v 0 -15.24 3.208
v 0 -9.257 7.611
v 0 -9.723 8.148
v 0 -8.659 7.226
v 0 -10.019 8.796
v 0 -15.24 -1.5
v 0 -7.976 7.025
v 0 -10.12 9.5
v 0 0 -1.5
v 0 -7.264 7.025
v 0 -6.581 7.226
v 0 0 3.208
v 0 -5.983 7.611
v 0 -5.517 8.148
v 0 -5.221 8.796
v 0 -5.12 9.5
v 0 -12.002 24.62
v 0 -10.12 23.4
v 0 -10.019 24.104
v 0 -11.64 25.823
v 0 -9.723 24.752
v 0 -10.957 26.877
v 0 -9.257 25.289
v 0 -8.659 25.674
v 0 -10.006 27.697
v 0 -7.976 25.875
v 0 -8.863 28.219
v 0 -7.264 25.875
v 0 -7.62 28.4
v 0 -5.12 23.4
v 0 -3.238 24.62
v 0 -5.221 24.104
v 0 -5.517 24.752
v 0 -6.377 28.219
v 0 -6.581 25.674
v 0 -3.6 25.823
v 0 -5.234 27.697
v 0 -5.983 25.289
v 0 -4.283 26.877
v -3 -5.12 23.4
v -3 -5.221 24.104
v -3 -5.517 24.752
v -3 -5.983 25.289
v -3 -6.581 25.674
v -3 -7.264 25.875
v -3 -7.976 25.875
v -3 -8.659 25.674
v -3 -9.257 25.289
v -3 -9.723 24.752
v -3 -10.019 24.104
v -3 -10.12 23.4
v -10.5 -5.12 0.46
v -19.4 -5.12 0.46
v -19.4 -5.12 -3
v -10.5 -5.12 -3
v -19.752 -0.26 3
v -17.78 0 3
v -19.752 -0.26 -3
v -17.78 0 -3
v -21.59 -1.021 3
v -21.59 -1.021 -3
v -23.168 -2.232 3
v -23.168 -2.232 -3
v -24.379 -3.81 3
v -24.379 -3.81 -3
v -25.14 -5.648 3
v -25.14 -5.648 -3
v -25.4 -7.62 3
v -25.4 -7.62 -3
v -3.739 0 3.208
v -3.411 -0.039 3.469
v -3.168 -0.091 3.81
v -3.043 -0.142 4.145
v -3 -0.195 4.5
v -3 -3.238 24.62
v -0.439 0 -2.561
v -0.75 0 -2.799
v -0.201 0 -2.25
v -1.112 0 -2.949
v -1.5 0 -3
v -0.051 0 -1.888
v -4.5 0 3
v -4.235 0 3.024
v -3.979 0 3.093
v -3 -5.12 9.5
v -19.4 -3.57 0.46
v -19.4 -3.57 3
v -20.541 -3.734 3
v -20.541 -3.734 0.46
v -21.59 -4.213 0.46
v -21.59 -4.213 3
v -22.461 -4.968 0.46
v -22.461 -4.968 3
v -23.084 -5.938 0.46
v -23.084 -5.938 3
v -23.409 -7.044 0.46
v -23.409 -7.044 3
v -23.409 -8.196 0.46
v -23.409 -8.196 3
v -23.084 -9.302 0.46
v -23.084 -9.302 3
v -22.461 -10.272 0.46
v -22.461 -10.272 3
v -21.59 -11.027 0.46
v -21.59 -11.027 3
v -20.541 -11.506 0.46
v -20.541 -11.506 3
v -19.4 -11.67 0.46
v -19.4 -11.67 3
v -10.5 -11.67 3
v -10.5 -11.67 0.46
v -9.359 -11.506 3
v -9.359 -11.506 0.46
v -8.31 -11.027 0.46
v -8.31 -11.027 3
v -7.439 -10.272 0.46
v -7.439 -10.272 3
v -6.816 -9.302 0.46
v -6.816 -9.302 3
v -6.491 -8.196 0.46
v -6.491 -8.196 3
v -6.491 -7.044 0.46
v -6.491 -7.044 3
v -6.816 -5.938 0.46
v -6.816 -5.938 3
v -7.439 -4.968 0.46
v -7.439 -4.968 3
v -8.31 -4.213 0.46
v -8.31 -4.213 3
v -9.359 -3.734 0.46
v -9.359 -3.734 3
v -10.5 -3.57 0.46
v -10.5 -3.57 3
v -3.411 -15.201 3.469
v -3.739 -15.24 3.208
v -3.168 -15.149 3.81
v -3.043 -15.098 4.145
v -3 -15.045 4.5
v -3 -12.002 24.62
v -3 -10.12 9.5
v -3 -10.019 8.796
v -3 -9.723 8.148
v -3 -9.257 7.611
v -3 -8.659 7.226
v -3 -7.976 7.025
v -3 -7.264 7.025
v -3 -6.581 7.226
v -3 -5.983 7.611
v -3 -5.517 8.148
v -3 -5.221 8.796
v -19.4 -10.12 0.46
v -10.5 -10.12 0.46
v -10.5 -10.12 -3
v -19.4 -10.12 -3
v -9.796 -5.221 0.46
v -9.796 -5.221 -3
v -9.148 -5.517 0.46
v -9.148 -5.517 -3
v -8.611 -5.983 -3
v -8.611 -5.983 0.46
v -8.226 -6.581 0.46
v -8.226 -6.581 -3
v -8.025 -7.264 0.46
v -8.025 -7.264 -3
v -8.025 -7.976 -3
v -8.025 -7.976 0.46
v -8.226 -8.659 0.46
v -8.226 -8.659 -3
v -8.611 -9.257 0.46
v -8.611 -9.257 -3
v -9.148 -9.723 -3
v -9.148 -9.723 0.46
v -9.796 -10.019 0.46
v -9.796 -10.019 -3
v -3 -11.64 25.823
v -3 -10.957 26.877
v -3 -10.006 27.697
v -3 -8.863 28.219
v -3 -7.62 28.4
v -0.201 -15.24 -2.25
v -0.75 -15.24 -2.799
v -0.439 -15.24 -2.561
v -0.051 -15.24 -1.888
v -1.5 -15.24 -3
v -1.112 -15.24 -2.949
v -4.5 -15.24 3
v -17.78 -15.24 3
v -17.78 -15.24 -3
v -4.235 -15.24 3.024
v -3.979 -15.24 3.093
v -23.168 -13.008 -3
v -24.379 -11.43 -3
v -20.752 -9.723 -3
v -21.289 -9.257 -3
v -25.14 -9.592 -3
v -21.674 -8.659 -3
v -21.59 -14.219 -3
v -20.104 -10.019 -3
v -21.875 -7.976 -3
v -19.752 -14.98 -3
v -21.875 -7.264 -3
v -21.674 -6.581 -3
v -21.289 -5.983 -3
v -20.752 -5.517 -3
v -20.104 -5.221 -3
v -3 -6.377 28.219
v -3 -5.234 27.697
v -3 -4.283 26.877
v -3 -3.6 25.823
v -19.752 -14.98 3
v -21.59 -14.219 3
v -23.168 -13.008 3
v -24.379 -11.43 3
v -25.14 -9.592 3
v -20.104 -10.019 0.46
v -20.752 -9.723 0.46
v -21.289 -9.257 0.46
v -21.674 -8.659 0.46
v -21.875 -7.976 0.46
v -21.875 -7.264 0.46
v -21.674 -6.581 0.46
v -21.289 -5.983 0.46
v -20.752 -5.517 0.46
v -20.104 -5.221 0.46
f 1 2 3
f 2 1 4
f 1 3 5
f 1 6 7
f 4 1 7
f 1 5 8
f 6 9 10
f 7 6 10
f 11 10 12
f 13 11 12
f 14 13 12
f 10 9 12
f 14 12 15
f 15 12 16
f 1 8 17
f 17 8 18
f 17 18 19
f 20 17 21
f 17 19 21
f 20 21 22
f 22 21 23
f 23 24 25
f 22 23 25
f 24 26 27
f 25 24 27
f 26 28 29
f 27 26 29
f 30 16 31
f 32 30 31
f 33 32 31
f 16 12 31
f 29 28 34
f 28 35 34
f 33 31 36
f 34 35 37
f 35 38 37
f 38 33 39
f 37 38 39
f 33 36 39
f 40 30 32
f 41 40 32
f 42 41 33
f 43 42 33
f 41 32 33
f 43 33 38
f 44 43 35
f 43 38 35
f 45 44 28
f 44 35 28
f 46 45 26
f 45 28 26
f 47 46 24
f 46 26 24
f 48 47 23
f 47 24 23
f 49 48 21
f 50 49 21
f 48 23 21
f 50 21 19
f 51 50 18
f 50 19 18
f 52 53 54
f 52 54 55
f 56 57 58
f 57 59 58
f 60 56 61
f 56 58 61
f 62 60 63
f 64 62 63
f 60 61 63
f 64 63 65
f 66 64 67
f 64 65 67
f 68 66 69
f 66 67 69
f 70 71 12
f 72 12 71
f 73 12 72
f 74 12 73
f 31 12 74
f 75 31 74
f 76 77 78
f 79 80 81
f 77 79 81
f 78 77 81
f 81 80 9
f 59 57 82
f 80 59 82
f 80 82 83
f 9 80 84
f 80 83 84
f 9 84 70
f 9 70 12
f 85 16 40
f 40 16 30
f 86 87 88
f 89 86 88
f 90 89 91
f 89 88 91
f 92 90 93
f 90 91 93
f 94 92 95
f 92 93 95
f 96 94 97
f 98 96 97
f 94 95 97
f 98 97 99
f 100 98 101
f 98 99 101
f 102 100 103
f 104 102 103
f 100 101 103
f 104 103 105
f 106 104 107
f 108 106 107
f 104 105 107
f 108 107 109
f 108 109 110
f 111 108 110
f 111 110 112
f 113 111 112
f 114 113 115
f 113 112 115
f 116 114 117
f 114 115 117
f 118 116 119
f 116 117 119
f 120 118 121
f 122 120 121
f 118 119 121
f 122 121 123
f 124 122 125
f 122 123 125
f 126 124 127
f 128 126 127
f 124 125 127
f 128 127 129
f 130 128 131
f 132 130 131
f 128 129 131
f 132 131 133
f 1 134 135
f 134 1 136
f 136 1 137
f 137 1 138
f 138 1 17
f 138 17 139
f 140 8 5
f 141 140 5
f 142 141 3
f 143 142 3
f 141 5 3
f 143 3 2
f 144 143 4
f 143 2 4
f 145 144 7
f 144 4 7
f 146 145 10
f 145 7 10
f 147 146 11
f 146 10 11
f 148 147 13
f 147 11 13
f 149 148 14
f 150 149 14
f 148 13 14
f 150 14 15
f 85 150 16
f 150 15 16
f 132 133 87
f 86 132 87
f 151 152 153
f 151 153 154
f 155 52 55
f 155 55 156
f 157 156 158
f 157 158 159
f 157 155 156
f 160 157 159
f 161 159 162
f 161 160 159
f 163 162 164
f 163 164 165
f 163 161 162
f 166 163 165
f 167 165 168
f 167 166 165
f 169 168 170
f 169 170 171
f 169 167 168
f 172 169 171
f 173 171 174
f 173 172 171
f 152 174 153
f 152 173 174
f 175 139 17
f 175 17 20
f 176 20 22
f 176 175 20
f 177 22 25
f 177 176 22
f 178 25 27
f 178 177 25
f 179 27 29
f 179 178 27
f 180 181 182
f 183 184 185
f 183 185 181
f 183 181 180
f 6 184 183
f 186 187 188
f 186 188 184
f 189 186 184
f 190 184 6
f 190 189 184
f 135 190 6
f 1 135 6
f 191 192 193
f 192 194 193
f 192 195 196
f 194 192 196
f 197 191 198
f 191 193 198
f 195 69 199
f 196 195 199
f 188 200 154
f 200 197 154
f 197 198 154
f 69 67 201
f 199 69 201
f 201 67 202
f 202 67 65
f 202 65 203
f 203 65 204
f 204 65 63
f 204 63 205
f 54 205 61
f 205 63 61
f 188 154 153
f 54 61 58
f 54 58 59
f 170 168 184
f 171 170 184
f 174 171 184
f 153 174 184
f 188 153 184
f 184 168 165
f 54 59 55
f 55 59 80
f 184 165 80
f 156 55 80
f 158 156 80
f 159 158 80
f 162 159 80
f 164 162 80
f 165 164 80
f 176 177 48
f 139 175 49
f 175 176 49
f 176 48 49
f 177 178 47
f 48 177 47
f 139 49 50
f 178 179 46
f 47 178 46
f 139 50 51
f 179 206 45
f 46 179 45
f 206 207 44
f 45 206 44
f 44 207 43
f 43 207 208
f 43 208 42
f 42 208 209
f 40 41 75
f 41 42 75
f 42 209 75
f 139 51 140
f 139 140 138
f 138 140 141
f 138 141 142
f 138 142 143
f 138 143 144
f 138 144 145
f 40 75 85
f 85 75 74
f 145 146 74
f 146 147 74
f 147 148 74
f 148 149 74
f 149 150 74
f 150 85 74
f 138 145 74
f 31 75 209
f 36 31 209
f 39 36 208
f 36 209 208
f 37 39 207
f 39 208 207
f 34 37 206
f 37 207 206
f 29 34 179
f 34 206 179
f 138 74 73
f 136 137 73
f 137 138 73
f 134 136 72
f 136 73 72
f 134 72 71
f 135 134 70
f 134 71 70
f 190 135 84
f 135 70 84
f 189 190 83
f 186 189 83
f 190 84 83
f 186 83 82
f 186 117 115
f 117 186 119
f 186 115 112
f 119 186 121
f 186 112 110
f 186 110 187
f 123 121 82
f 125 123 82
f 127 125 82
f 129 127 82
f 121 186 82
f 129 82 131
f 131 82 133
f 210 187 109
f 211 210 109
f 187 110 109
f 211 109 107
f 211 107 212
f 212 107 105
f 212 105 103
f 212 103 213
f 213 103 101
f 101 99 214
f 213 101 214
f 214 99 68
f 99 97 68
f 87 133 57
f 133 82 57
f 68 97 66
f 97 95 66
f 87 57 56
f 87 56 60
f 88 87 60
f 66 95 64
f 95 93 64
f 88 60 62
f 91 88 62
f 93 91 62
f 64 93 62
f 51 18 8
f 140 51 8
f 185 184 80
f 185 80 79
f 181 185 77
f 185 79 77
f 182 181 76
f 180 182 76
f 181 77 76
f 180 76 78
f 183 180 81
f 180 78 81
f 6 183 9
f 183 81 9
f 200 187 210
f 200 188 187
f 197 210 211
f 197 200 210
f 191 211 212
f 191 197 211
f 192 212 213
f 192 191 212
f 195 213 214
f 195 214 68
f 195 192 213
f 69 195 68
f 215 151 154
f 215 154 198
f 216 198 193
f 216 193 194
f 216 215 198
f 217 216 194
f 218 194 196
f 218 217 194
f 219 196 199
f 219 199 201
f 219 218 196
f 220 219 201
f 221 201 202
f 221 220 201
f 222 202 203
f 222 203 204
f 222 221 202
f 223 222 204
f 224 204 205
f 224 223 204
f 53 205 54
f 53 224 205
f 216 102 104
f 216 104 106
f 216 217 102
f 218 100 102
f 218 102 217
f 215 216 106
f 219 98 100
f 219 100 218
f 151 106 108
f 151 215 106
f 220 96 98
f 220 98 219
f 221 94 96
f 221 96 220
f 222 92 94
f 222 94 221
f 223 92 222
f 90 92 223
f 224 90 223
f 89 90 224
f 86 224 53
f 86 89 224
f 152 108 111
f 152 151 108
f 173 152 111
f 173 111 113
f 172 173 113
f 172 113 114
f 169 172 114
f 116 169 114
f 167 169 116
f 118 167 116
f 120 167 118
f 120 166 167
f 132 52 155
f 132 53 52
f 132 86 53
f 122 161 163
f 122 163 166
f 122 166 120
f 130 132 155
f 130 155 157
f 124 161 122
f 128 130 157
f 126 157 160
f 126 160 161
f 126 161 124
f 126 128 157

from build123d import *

# Parameters (mm, degrees)
F1_DEPTH    = 15.24
F3_DEPTH    = 3
F5_DEPTH    = 2.54
F6_DEPTH    = 6
F7_C1_SIZE2 = 3.81
F7_C1_SIZE  = 25.1924509954
F7_C2_SIZE2 = 3.81
F7_C2_SIZE  = 25.1924509954
F8_T1_DEPTH = 22.1165158115
F9_R        = 7.61999


# Not quite as in the source:
# - a fillet or chamfer that OpenCascade refuses, or shapes differently, is made with other operations: its cross-section is extruded or revolved along the edge and cut away or added
# - a fillet or chamfer is up to 0.001 mm smaller than in the source, because OpenCascade refuses the exact size


with BuildPart() as f1:
    # F0 (on Front) → F1 (new body)
    with BuildSketch(Plane.XZ):
        with BuildLine():
            ThreePointArc((-3, 4.5), (-3.4393398282, 3.4393398282), (-4.5, 3))
            Line((-4.5, 3), (-25.4, 3))
            Line((-25.4, 3), (-25.4, -3))
            Line((-25.4, -3), (-1.5, -3))
            ThreePointArc((-1.5, -3), (-0.4393398282, -2.5606601718), (0, -1.5))
            Line((0, -1.5), (0, 28.4))
            Line((0, 28.4), (-3, 28.4))
            Line((-3, 28.4), (-3, 4.5))
        make_face()
    extrude(amount=F1_DEPTH)

    # F2 (on face) → F3 (cut, through all)
    with BuildSketch(Plane.YZ):
        with BuildLine():
            ThreePointArc((-5.12, 23.4), (-7.62, 25.9), (-10.12, 23.4))
            Line((-10.12, 23.4), (-10.12, 9.5))
            ThreePointArc((-10.12, 9.5), (-7.62, 7), (-5.12, 9.5))
            Line((-5.12, 9.5), (-5.12, 23.4))
        make_face()
    extrude(amount=-F3_DEPTH, mode=Mode.SUBTRACT)

    # F4 (on face) → F5 (cut)
    with BuildSketch(Plane.XY.offset(3)):
        with BuildLine():
            ThreePointArc((-19.4, -3.57), (-23.45, -7.62), (-19.4, -11.67))
            Line((-19.4, -11.67), (-10.5, -11.67))
            ThreePointArc((-10.5, -11.67), (-6.45, -7.62), (-10.5, -3.57))
            Line((-10.5, -3.57), (-19.4, -3.57))
        make_face()
        with BuildLine():
            Line((-10.5, -10.12), (-19.4, -10.12))
            ThreePointArc((-19.4, -10.12), (-21.9, -7.62), (-19.4, -5.12))
            Line((-19.4, -5.12), (-10.5, -5.12))
            ThreePointArc((-10.5, -5.12), (-8, -7.62), (-10.5, -10.12))
        make_face(mode=Mode.SUBTRACT)
    extrude(amount=-F5_DEPTH, mode=Mode.SUBTRACT)

    # F6 (cut, through all): a face of the model
    f6_faces = [f1.faces().sort_by_distance(p)[0] for p in [
        (-14.95, -7.62, 3),
    ]]
    extrude(f6_faces, amount=-F6_DEPTH, mode=Mode.SUBTRACT)

    # F7: chamfer of 3.81 x 25.1924509954 on 2 edges, made by hand

    # F7_c1
    f7_c1_edges = [f1.edges().sort_by_distance(p)[0] for p in [
        (-1.5, 0, 28.4),
    ]]
    f7_c1_side = f1.faces().sort_by_distance((-1.5, 0, 28.3238))[0]
    chamfer(f7_c1_edges, length=F7_C1_SIZE, length2=F7_C1_SIZE2, reference=f7_c1_side)

    # F7_c2
    f7_c2_edges = [f1.edges().sort_by_distance(p)[0] for p in [
        (-1.5, -15.24, 28.4),
    ]]
    f7_c2_side = f1.faces().sort_by_distance((-1.5, -15.24, 28.3238))[0]
    chamfer(f7_c2_edges, length=F7_C2_SIZE, length2=F7_C2_SIZE2, reference=f7_c2_side)

    # F8: fillet of radius 4.445 on 2 edges, made by hand

    # F8_s2 → F8_t1 (cut)
    with BuildSketch(Plane.YZ.offset(-12.5582579057)):
        with BuildLine():
            ThreePointArc((-12.0017189515, 24.6196846016), (-10.5052742427, 27.3249071244), (-7.6066968377, 28.4))
            Line((-7.6066968377, 28.4), (-11.43, 28.4))
            Line((-11.43, 28.4), (-12.0017189515, 24.6196846016))
        make_face()
        with BuildLine():
            ThreePointArc((-3.2382810485, 24.6196846016), (-4.7347257573, 27.3249071244), (-7.6333031623, 28.4))
            Line((-7.6333031623, 28.4), (-3.81, 28.4))
            Line((-3.81, 28.4), (-3.2382810485, 24.6196846016))
        make_face()
    extrude(amount=F8_T1_DEPTH, mode=Mode.SUBTRACT)

    # F9 (radius 7.62 in the source; OpenCascade refuses exactly that, so slightly less here)
    f9_edges = [f1.edges().sort_by_distance(p)[0] for p in [
        (-25.4, -15.24, 0),
        (-25.4, 0, 0),
    ]]
    fillet(f9_edges, radius=F9_R)


solid = f1.part
